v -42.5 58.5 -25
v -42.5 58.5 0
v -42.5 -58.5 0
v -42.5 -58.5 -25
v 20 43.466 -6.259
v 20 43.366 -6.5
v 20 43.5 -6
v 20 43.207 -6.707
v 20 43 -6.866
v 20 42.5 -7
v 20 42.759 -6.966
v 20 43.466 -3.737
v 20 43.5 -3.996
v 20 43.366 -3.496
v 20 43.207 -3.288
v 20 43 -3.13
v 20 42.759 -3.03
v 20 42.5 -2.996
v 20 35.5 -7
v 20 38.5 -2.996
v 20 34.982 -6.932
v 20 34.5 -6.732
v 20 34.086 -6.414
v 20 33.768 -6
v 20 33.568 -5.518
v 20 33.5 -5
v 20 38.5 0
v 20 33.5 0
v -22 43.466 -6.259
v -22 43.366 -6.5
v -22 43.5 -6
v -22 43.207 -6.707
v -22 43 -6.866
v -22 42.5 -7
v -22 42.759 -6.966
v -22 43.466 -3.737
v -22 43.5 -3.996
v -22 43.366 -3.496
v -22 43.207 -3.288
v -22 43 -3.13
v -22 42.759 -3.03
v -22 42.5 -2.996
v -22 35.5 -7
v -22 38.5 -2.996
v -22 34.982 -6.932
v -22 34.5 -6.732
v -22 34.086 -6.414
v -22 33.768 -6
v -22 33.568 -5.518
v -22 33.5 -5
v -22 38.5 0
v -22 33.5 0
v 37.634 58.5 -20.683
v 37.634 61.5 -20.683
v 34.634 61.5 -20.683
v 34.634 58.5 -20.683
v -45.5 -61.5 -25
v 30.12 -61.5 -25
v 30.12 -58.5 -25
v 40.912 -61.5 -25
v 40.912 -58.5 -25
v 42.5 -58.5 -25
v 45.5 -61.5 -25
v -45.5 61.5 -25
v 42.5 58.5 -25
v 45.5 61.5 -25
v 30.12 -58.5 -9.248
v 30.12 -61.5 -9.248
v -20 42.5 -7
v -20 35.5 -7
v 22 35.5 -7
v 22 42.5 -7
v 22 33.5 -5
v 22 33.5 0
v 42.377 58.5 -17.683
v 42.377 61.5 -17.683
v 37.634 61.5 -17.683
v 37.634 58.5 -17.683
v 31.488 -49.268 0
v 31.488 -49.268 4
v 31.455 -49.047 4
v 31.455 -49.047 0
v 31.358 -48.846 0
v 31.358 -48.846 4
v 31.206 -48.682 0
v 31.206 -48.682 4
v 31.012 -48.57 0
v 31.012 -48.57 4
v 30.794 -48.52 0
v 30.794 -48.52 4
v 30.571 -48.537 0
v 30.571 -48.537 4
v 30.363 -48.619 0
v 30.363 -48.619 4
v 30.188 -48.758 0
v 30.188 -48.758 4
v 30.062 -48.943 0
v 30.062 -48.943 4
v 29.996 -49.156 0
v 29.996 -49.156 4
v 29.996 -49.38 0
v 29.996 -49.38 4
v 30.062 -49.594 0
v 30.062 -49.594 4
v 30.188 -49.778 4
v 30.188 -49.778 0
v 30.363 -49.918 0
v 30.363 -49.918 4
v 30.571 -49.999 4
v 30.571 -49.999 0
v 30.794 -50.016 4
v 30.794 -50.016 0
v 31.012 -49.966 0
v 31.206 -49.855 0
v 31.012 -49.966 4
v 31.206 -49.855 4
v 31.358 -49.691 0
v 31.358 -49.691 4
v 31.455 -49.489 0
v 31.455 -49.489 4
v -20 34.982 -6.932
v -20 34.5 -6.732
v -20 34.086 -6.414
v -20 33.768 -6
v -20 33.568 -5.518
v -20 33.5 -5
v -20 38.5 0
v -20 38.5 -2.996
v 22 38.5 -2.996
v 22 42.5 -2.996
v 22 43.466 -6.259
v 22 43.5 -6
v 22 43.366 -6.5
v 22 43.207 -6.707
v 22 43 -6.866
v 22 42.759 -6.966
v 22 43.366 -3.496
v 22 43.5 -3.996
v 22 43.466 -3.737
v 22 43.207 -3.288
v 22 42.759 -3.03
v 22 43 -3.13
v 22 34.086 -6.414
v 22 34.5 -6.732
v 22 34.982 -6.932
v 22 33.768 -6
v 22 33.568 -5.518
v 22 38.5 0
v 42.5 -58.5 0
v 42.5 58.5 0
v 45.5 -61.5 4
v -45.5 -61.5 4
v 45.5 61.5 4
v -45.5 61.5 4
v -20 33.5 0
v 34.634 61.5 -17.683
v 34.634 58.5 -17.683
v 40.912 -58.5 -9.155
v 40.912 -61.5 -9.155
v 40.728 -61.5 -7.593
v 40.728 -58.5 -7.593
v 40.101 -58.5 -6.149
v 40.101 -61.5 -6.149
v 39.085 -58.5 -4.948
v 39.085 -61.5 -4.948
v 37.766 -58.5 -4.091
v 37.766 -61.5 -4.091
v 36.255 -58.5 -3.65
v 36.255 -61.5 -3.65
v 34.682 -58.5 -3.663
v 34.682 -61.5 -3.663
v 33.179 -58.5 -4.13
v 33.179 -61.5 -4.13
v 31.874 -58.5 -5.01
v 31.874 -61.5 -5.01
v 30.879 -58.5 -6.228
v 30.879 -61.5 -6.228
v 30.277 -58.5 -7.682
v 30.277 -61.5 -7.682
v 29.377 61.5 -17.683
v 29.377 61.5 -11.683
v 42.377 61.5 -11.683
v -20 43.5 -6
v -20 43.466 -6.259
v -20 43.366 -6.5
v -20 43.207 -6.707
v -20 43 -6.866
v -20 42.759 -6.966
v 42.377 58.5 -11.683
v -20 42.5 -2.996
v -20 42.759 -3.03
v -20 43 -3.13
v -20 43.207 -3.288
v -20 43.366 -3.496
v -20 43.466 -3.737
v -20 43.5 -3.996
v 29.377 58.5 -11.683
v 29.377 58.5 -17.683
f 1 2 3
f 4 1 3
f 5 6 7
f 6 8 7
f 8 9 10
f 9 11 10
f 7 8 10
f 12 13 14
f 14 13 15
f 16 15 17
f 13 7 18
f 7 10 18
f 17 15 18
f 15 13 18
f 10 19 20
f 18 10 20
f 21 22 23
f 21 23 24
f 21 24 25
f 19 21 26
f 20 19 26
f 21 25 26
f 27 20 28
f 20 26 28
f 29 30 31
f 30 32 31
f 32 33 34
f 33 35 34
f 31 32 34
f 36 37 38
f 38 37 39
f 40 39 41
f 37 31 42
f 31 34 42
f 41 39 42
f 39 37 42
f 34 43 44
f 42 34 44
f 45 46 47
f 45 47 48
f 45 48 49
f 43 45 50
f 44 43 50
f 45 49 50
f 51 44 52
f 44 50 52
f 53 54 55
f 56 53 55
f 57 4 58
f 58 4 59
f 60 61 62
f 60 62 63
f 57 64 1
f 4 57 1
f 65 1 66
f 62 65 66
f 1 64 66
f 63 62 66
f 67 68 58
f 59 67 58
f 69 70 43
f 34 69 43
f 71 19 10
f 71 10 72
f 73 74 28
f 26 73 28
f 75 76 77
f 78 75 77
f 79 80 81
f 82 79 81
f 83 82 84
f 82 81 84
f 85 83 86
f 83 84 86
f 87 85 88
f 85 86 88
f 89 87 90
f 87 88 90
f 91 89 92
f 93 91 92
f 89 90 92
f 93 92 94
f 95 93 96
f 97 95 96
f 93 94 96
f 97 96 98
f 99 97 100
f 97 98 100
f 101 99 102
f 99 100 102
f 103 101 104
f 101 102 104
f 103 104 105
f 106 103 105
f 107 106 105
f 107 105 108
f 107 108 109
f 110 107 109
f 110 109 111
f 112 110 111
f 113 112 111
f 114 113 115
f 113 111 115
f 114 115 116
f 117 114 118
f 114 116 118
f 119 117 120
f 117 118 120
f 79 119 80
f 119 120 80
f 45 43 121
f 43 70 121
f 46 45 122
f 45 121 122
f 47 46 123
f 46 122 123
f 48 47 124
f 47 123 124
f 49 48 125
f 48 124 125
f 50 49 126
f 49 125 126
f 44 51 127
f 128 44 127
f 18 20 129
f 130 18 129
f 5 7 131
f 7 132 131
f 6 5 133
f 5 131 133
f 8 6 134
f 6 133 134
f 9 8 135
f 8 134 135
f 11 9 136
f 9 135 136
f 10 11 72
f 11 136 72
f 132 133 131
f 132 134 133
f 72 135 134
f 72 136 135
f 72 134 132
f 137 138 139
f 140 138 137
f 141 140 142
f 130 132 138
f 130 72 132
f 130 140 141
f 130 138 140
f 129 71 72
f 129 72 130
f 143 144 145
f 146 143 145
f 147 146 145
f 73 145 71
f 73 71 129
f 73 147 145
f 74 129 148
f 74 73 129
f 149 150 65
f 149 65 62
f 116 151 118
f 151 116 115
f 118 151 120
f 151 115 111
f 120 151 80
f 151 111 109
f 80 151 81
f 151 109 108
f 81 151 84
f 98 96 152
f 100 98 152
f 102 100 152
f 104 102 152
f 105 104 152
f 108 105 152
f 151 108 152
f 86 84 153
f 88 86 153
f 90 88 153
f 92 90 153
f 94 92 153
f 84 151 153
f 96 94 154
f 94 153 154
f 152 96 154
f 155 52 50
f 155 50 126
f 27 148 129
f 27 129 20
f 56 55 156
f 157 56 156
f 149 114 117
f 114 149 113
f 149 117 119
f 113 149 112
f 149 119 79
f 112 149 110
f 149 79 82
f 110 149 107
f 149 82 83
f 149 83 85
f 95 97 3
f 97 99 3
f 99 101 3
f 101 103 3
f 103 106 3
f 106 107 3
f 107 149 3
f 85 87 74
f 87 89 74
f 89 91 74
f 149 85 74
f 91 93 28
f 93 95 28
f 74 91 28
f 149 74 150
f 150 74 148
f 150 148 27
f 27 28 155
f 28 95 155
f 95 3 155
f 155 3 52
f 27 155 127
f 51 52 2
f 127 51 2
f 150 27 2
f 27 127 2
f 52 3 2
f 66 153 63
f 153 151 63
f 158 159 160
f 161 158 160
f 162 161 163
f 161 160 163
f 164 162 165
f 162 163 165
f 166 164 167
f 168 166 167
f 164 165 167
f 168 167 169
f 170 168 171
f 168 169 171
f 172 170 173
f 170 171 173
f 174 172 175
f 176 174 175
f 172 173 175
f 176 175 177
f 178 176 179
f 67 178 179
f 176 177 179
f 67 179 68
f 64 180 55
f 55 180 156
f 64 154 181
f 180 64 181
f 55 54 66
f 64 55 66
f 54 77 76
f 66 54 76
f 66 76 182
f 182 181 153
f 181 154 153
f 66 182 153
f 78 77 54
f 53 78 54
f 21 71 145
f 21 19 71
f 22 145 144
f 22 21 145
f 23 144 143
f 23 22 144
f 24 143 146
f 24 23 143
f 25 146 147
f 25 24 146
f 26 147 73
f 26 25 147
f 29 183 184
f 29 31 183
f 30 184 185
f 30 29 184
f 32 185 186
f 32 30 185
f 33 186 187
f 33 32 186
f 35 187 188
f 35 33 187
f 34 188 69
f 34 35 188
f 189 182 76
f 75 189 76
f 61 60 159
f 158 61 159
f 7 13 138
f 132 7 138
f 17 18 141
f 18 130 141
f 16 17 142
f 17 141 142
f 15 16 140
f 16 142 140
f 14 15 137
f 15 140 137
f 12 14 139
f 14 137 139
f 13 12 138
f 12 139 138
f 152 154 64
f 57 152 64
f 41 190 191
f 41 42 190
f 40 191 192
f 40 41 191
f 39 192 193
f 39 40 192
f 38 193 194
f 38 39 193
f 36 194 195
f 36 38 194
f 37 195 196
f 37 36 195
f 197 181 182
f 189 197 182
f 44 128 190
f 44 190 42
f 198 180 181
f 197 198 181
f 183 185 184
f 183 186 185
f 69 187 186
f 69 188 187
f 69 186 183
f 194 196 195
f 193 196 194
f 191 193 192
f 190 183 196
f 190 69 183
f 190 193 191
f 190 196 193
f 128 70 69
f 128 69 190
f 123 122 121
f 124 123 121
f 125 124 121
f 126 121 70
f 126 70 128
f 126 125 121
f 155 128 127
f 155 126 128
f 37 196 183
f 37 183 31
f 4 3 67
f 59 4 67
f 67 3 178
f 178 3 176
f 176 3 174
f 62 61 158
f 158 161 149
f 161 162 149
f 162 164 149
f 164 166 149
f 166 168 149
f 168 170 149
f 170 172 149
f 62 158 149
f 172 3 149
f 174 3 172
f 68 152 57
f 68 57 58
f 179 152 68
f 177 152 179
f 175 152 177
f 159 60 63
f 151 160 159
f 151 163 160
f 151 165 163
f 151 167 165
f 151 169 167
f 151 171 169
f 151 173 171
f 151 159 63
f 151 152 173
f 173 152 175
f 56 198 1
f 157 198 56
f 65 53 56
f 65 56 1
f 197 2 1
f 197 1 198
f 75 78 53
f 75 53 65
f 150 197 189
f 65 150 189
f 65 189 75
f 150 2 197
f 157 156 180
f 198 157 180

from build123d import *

# Parameters (mm, degrees)
F0_W      = 85
F0_H      = 117
F1_DEPTH  = 4
F2_W      = 2
F2_H      = 5
F3_DEPTH  = 7
F4_W      = 2
F4_H      = 4.0044696238
F5_DEPTH  = 5
F6_R      = 1
F7_R      = 1
F8_R      = 2
F11_W     = 117
F11_H     = 4
F12_DEPTH = 3
F10_W     = 117
F10_H     = 4
F14_DEPTH = 3
F13_W     = 85
F13_H     = 3
F13_W_2   = 3
F13_H_2   = 117
F15_DEPTH = 25
F16_DEPTH = 3
F18_DEPTH = 3
F19_R     = 0.75
F20_DEPTH = 4
F21_DEPTH = 3
F23_DEPTH = 3


# Not quite as in the source:
# - a feature names something its author has since deleted; it is built from what else it names


with BuildPart() as f1:
    # F0 (on Top) → F1 (new body)
    with BuildSketch(Plane.XY):
        Rectangle(F0_W, F0_H)
    extrude(amount=F1_DEPTH)

    # F2 (on face) → F3 (join)
    with BuildSketch(Plane(origin=(0, 0, 0), x_dir=(1, 0, 0), z_dir=(0, 0, -1))):
        with Locations((-21, -36)):
            Rectangle(F2_W, F2_H)
    extrude(amount=F3_DEPTH)

    # F4 (on face) → F5 (join)
    with BuildSketch(Plane(origin=(0, 38.5, 0), x_dir=(-1, 0, 0), z_dir=(0, 1, 0))):
        with Locations((21, -4.9977651881)):
            Rectangle(F4_W, F4_H)
    extrude(amount=F5_DEPTH)

    # F6
    f6_edges = [f1.edges().sort_by_distance(p)[0] for p in [
        (-21, 43.5, -2.99553),
    ]]
    fillet(f6_edges, radius=F6_R)

    # F7
    f7_edges = [f1.edges().sort_by_distance(p)[0] for p in [
        (-21, 43.5, -7),
    ]]
    fillet(f7_edges, radius=F7_R)

    # F8
    f8_edges = [f1.edges().sort_by_distance(p)[0] for p in [
        (-21, 33.5, -7),
    ]]
    fillet(f8_edges, radius=F8_R)


with BuildPart() as f9_1:
    # F9: instance of F1
    add(f1.part.mirror(Plane.YZ))


with BuildPart() as f1_1:
    add(f1.part)

    add(f9_1.part)  # F12 merges F9_1
    # F11 (on face) → F12 (join)
    with BuildSketch(Plane(origin=(-42.5, 0, 0), x_dir=(0, -1, 0), z_dir=(-1, 0, 0))):
        with Locations((0, 2)):
            Rectangle(F11_W, F11_H)
    extrude(amount=F12_DEPTH)

    # F10 (on face) → F14 (join)
    with BuildSketch(Plane.YZ.offset(42.5)):
        with Locations((0, 2)):
            Rectangle(F10_W, F10_H)
    extrude(amount=F14_DEPTH)

    # F13 (on face) → F15 (join)
    with BuildSketch(Plane(origin=(0, 0, 0), x_dir=(1, 0, 0), z_dir=(0, 0, -1))):
        with Locations((0, 60)):
            Rectangle(F13_W, F13_H)
        with Locations((0, -60)):
            Rectangle(F13_W, F13_H)
        with Locations((-44, 0)):
            Rectangle(F13_W_2, F13_H_2)
        with Locations((44, 0)):
            Rectangle(F13_W_2, F13_H_2)
    extrude(amount=F15_DEPTH)

    # F16 (add): a face of the model
    f16_faces = [f1_1.faces().sort_by_distance(p)[0] for p in [
        (0, 58.5, 0.9550916186),
    ]]
    extrude(f16_faces, amount=F16_DEPTH)

    # F17 (on face) → F18 (cut)
    with BuildSketch(Plane(origin=(0, 61.5, 0), x_dir=(-1, 0, 0), z_dir=(0, 1, 0))):
        Polygon((-29.3773965985, -11.6825154486), (-42.3773965985, -11.6825154486), (-42.3773965985, -17.6825154486), (-37.6342944801, -17.6825154486), (-37.6342944801, -20.6825154486), (-34.6342944801, -20.6825154486), (-34.6342944801, -17.6825154486), (-29.3773965985, -17.6825154486), align=None)
    extrude(amount=-F18_DEPTH, mode=Mode.SUBTRACT)

    # F19 (on face) → F20 (cut, through all)
    with BuildSketch(Plane.XY.offset(4)):
        with Locations((30.7380352169, -49.2682121694)):
            Circle(F19_R)
    extrude(amount=-F20_DEPTH, mode=Mode.SUBTRACT)

    # F21 (add): a face of the model
    f21_faces = [f1_1.faces().sort_by_distance(p)[0] for p in [
        (-44.5449083814, -58.5, -10.5),
    ]]
    extrude(f21_faces, amount=F21_DEPTH)

    # F22 (on face) → F23 (cut, through all)
    with BuildSketch(Plane.XZ.offset(61.5)):
        with BuildLine():
            Line((40.9117795325, -25), (40.9117795325, -9.155403553))
            ThreePointArc((40.9117795325, -9.155403553), (35.4678711158, -3.59895141), (30.1197935699, -9.2477004601))
            Line((30.1197935699, -9.2477004601), (30.1197935699, -25))
            Line((30.1197935699, -25), (40.9117795325, -25))
        make_face()
    extrude(amount=-F23_DEPTH, mode=Mode.SUBTRACT)


solid = f1_1.part
